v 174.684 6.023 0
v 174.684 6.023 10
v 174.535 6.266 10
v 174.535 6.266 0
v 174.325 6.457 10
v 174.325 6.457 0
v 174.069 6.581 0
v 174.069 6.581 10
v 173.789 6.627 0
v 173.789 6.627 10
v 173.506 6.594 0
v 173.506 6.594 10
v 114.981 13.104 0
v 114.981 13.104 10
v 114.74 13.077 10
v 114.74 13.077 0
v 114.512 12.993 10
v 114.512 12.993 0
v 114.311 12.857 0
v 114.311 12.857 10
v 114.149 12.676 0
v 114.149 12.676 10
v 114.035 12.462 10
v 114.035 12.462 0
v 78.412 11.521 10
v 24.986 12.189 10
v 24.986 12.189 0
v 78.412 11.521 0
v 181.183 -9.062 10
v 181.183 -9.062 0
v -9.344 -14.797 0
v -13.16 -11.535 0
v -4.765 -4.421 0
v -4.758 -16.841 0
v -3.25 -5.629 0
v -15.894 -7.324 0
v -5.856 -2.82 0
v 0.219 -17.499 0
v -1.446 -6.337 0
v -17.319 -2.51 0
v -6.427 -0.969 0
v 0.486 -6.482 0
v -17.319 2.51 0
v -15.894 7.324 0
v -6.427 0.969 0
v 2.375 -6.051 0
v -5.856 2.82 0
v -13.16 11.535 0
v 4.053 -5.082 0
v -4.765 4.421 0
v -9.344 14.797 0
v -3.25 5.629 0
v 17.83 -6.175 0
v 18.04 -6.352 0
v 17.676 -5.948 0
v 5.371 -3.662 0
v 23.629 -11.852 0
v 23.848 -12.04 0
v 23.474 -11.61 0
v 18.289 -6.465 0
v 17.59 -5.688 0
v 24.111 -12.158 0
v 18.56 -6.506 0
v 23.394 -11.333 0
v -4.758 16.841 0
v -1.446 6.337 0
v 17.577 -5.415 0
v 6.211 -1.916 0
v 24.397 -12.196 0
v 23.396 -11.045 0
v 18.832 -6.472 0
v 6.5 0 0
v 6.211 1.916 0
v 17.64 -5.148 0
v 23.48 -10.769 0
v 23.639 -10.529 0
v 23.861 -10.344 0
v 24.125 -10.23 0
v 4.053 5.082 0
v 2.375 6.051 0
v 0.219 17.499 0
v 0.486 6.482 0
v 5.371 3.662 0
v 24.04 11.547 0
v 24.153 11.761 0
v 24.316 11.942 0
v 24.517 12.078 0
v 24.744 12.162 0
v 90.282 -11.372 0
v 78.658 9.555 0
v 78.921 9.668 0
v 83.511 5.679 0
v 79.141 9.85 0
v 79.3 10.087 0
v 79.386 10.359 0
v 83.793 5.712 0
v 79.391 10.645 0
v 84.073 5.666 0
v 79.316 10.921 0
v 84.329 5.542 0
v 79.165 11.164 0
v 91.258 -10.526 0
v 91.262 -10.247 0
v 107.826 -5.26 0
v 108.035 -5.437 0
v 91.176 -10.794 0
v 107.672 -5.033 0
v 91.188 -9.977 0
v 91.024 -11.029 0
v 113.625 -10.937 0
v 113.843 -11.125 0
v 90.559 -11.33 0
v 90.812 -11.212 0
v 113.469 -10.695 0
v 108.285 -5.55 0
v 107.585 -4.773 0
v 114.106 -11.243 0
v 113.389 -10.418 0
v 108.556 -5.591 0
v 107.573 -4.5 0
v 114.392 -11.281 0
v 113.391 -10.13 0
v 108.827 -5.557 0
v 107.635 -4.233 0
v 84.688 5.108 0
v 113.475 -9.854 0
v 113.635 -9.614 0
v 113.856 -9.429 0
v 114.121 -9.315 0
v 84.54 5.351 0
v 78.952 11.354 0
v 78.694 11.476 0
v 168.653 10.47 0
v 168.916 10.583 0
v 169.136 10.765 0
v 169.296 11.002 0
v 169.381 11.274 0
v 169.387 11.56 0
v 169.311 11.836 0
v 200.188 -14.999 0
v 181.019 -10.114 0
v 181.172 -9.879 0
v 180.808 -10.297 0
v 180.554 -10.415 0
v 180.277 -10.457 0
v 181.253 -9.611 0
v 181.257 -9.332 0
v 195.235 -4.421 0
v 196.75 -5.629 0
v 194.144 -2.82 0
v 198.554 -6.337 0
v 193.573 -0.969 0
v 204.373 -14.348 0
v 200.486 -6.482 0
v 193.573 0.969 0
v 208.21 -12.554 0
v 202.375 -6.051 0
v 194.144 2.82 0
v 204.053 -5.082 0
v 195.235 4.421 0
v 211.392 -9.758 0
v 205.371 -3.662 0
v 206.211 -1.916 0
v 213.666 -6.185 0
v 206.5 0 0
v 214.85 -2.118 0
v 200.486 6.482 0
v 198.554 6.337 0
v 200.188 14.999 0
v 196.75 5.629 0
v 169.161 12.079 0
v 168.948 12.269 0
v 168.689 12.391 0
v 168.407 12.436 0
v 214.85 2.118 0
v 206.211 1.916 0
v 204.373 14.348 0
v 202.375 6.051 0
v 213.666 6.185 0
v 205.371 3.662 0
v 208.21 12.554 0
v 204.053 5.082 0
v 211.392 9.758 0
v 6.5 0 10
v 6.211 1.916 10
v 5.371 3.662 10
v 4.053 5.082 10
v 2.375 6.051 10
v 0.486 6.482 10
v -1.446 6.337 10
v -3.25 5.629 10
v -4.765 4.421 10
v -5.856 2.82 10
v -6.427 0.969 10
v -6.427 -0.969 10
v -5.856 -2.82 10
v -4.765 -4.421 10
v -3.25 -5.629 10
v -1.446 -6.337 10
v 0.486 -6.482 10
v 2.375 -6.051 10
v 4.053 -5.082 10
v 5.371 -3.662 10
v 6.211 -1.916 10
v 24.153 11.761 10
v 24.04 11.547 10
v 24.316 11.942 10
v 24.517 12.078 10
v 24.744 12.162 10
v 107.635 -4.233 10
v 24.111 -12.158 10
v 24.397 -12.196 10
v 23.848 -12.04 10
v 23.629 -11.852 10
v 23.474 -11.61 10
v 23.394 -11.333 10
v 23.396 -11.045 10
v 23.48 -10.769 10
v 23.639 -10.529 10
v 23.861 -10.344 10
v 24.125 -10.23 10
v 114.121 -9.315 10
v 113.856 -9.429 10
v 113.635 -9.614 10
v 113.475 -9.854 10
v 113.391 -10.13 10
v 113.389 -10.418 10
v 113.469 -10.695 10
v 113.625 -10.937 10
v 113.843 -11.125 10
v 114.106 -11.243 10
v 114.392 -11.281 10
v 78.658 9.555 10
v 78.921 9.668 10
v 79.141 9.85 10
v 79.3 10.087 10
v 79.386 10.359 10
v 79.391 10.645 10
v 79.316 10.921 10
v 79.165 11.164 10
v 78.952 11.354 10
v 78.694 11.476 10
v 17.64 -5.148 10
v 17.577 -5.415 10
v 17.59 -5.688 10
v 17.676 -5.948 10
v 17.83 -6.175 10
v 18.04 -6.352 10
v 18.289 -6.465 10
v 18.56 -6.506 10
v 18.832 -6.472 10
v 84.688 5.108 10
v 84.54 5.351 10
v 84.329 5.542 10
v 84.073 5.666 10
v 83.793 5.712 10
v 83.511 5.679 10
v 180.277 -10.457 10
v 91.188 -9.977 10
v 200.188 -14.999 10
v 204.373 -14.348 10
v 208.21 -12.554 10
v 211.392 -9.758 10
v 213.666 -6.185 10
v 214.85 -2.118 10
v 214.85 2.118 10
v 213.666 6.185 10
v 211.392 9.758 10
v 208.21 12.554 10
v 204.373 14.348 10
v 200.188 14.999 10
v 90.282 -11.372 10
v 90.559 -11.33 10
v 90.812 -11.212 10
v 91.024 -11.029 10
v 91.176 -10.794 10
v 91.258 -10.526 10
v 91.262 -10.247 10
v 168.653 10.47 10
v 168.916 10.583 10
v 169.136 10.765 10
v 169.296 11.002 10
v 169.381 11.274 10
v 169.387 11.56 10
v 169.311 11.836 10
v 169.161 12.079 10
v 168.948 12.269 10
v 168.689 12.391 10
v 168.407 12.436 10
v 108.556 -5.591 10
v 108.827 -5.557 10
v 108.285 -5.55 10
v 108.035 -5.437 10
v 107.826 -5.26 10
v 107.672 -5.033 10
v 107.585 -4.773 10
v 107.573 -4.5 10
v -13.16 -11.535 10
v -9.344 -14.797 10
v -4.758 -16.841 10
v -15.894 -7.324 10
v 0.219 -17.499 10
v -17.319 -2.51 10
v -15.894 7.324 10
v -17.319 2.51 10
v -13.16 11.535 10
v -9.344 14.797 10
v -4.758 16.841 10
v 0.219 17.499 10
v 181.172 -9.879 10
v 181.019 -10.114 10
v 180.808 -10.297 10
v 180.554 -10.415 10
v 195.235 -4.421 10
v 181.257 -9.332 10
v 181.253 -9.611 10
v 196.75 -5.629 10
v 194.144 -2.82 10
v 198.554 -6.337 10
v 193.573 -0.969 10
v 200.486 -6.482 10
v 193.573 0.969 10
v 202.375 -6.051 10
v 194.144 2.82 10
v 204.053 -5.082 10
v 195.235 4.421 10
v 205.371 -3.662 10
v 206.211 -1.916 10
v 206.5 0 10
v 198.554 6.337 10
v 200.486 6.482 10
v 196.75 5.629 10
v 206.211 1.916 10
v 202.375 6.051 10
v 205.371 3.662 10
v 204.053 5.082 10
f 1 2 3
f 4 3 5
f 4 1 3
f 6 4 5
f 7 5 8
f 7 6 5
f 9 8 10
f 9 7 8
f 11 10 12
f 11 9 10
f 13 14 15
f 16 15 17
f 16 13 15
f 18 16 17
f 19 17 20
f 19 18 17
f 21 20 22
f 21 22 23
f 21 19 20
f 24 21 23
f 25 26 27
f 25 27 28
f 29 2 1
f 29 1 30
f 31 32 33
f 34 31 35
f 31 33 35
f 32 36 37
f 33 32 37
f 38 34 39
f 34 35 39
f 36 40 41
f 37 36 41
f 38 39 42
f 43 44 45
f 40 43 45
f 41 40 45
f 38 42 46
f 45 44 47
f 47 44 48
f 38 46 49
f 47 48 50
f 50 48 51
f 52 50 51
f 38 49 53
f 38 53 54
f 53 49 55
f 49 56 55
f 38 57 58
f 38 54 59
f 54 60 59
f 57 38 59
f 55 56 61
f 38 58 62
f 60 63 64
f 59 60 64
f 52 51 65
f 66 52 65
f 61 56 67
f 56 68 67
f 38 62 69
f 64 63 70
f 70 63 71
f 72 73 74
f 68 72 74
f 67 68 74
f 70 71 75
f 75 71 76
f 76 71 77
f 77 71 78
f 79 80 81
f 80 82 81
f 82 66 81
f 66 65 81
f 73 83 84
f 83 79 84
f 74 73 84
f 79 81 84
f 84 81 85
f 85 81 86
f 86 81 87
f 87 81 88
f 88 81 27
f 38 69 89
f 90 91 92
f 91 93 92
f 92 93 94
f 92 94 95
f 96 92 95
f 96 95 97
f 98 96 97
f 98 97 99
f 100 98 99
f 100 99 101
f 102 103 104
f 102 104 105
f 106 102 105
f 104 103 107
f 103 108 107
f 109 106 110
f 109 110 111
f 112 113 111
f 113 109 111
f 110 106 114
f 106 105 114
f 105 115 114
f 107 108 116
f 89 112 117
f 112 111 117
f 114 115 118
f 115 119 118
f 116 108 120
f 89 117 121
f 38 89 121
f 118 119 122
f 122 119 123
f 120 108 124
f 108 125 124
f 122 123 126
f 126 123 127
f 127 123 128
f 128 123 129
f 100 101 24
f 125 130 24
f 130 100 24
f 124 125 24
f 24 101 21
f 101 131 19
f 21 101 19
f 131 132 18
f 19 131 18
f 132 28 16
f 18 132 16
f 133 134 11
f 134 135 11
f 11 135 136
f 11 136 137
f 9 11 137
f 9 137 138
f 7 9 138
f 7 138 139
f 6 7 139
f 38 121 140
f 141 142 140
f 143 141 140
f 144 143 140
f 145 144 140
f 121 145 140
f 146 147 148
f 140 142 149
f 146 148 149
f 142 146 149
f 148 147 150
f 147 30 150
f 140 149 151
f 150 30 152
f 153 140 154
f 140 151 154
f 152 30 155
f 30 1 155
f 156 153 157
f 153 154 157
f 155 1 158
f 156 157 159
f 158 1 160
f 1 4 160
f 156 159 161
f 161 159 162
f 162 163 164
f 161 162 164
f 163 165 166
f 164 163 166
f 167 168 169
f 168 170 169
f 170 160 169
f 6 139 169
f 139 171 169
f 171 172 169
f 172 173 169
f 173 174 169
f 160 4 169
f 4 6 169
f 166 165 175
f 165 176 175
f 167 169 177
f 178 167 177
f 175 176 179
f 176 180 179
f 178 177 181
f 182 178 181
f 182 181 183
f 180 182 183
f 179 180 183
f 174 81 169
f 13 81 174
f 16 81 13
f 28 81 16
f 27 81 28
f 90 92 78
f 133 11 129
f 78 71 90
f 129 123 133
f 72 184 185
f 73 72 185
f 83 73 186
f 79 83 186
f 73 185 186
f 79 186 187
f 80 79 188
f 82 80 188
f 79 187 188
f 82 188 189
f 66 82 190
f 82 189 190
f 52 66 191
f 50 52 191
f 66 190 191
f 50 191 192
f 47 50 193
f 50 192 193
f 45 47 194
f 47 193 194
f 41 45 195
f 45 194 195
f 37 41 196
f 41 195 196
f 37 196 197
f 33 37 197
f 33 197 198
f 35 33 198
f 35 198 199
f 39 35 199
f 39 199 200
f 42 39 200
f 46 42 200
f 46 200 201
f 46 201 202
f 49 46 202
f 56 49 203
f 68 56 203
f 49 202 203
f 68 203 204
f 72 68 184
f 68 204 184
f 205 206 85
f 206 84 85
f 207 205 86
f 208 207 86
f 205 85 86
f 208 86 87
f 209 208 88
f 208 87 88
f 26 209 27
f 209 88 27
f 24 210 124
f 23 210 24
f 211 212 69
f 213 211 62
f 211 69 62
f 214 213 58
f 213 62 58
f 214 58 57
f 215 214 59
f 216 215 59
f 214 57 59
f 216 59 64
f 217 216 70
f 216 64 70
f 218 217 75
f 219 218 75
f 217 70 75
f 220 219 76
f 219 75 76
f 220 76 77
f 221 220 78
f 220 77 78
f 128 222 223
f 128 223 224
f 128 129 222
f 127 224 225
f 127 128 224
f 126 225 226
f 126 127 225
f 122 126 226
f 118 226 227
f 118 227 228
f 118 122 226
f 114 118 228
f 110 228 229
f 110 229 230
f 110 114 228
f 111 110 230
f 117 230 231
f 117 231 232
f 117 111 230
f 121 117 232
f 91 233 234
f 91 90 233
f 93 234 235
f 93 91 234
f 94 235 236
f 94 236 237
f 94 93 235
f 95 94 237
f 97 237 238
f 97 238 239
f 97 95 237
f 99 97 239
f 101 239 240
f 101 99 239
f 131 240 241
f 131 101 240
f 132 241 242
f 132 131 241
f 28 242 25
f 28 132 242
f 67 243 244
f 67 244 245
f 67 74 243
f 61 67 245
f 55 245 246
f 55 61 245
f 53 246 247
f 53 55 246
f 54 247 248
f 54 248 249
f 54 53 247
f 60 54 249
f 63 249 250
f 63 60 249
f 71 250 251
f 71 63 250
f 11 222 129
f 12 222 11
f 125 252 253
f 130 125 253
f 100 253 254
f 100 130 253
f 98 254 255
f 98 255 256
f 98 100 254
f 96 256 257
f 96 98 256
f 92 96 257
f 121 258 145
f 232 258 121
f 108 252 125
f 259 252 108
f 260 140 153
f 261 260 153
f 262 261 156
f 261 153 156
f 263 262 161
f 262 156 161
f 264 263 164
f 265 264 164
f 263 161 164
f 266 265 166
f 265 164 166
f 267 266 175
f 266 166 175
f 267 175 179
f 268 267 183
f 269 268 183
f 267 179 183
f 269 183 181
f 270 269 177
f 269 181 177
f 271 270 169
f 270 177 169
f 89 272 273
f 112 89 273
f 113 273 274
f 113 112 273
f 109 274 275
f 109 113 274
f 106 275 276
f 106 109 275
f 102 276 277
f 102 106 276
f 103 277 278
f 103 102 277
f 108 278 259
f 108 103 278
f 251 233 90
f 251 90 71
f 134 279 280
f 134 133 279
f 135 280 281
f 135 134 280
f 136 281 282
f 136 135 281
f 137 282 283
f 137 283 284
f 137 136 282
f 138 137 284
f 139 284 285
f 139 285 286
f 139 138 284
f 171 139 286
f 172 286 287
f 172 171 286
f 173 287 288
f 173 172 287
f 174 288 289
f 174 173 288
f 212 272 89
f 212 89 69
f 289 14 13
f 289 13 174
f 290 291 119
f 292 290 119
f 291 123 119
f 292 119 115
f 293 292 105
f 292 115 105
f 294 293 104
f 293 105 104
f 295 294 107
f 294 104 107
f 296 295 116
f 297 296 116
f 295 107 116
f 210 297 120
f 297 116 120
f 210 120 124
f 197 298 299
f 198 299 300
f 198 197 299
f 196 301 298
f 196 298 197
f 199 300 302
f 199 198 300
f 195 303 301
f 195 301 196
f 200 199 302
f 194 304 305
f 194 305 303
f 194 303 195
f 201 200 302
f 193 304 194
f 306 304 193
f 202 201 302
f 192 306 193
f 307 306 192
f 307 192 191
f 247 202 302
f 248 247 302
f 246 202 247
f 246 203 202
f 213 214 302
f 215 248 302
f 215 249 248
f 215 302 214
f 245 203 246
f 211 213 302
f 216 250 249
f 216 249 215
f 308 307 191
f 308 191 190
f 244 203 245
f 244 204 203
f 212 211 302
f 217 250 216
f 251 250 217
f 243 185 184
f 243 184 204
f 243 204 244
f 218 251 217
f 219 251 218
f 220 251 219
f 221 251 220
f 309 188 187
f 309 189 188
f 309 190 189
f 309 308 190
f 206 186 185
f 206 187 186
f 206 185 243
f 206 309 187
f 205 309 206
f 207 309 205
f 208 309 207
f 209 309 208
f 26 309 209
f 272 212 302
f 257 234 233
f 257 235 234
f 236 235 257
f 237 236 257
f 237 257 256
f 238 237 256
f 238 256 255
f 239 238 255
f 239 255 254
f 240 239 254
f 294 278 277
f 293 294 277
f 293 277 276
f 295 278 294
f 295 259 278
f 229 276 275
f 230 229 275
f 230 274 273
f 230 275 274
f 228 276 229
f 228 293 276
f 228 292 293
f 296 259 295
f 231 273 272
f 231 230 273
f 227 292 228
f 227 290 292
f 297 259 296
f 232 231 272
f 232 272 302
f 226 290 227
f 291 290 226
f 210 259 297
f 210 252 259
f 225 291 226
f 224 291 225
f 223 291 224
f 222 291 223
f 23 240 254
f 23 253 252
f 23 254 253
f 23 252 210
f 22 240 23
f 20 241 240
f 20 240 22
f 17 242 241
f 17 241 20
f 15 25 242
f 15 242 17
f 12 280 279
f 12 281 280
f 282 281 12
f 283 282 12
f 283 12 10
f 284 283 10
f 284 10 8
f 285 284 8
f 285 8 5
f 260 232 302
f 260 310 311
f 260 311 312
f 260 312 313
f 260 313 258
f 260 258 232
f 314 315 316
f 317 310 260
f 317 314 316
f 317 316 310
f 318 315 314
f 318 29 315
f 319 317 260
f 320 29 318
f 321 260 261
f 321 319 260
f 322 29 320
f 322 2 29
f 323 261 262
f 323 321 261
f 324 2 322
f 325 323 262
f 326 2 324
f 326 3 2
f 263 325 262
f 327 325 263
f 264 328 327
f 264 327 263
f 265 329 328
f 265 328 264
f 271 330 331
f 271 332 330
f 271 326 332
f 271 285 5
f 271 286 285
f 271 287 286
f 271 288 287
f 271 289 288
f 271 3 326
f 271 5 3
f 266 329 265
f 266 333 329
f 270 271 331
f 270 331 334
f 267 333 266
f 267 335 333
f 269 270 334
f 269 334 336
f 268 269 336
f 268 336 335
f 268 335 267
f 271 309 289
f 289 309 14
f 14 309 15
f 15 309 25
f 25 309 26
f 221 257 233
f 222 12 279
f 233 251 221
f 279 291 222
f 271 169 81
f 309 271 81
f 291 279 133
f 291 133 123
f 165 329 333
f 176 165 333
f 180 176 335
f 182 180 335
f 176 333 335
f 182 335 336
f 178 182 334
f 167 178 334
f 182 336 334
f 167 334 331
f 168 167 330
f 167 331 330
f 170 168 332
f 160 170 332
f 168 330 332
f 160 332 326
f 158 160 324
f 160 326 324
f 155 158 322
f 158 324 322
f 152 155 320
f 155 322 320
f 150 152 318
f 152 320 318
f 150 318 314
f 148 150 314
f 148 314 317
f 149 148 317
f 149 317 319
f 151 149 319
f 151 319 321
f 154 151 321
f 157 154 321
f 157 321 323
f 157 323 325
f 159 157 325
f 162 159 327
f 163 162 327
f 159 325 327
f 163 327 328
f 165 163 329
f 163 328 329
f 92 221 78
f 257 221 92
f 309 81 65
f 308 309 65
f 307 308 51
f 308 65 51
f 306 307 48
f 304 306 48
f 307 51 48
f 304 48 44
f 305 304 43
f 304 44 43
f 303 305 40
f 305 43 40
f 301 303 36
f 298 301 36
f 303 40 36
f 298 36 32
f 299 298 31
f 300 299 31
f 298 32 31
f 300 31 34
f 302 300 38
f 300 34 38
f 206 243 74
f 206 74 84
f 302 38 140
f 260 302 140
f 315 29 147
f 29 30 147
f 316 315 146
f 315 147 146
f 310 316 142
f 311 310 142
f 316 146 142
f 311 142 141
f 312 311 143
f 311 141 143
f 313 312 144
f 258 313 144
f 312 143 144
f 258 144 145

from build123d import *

# Parameters (mm, degrees)
EXTRUDE_1_DEPTH     = 10
SKETCH_2_R          = 6.5
CUT_EXTRUDE_1_DEPTH = 10
CUT_EXTRUDE_2_DEPTH = 10
FILLET_1_R          = 1
SKETCH_4_R          = 6.5
CUT_EXTRUDE_3_DEPTH = 10


with BuildPart() as part:
    # 草图1 → 凸台-拉伸1 (new body)
    with BuildSketch(Plane.XY):
        with BuildLine():
            Line((200.1875, 14.998828079), (0.21875, 17.498632759))
            ThreePointArc((0.21875, 17.498632759), (-17.5, 0), (0.21875, -17.498632759))
            Line((0.21875, -17.498632759), (200.1875, -14.998828079))
            ThreePointArc((200.1875, -14.998828079), (215, 0), (200.1875, 14.998828079))
        make_face()
    extrude(amount=EXTRUDE_1_DEPTH)

    # 草图2 → 切除-拉伸1 (cut)
    with BuildSketch(Plane.XY.offset(10)):
        Circle(SKETCH_2_R)
    extrude(amount=-CUT_EXTRUDE_1_DEPTH, mode=Mode.SUBTRACT)

    # 草图3 → 切除-拉伸2 (cut)
    with BuildSketch(Plane.XY.offset(10)):
        Polygon((24.289001935, 12.19734043), (85.658139631, 11.430166271), (16.937408094, -6.979422532), align=None)
        Polygon((16.414613885, -12.295777972), (84.346077325, 5.902373893), (91.781134838, -11.353622851), align=None)
        Polygon((106.93275646, -6.06439659), (114.284350301, 13.112366373), (175.653487997, 12.345192214), align=None)
        Polygon((181.776483204, -10.438596909), (106.409962251, -11.380752029), (174.341425691, 6.817399835), align=None)
    extrude(amount=-CUT_EXTRUDE_2_DEPTH, mode=Mode.SUBTRACT)

    # 圆角1
    fillet_1_edges = [part.edges().sort_by_distance(p)[0] for p in [
        (84.346077325, 5.902373893, 5),
        (91.781134838, -11.353622851, 5),
        (16.414613885, -12.295777972, 5),
        (175.653487997, 12.345192214, 5),
        (106.93275646, -6.06439659, 5),
        (114.284350301, 13.112366373, 5),
        (174.341425691, 6.817399835, 5),
        (181.776483204, -10.438596909, 5),
        (106.409962251, -11.380752029, 5),
        (85.658139631, 11.430166271, 5),
        (16.937408094, -6.979422532, 5),
        (24.289001935, 12.19734043, 5),
    ]]
    fillet(fillet_1_edges, radius=FILLET_1_R)

    # 草图4 → 切除-拉伸3 (cut)
    with BuildSketch(Plane.XY.offset(10)):
        with Locations((200, 0)):
            Circle(SKETCH_4_R)
    extrude(amount=-CUT_EXTRUDE_3_DEPTH, mode=Mode.SUBTRACT)


solid = part.part
